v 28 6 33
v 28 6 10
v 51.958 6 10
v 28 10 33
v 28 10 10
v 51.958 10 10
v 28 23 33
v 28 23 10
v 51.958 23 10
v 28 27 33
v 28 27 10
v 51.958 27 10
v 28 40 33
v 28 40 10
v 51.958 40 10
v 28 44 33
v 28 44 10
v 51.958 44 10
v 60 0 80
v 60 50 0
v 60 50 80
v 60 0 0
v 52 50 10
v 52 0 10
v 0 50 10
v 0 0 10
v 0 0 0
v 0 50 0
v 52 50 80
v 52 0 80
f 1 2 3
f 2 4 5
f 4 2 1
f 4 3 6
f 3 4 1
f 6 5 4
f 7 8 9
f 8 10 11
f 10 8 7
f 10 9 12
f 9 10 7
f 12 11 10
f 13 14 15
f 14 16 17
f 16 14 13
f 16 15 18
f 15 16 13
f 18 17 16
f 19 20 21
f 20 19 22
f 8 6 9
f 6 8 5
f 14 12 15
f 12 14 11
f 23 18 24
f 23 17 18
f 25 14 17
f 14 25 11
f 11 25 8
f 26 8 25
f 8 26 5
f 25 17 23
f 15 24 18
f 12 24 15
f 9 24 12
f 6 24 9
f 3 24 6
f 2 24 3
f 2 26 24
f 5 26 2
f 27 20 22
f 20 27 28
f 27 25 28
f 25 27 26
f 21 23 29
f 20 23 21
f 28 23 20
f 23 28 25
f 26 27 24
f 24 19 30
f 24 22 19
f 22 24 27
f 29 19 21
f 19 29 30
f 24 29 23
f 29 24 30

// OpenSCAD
$fn = 32;

// ----------------------------------------------------------------------
// Rib bracket: 3-gusset L bracket
// ----------------------------------------------------------------------

// --- parameters (mm) ---
base_l = 60;              // foot length, X
base_w = 50;              // foot width, Y
base_t = 10;              // foot thickness
plate_t = 8;              // upright plate thickness
plate_h = 80;             // overall height
gus_l = 24;               // gusset leg along the foot
gus_h = 24;               // gusset height
gus_t = 4;                // gusset thickness
gus_edge = 6;             // gusset margin from the foot edge
n_gus = 3;                // gusset count

gus_pitch = (base_w - 2 * gus_edge - gus_t) / (n_gus - 1);  // gusset pitch

union() {
  cube([base_l, base_w, base_t]);
  translate([base_l - plate_t, 0, base_t - 1])
    cube([plate_t, base_w, plate_h - base_t + 1]);
  for (i = [0 : n_gus - 1])
    translate([base_l - plate_t - gus_l, gus_edge + i * gus_pitch, base_t - 1])
      rotate([-90, 0, 0])
        linear_extrude(height = gus_t)
          polygon(points = [[0, 0], [gus_l + 1, 0], [0, -gus_h]]);
}
